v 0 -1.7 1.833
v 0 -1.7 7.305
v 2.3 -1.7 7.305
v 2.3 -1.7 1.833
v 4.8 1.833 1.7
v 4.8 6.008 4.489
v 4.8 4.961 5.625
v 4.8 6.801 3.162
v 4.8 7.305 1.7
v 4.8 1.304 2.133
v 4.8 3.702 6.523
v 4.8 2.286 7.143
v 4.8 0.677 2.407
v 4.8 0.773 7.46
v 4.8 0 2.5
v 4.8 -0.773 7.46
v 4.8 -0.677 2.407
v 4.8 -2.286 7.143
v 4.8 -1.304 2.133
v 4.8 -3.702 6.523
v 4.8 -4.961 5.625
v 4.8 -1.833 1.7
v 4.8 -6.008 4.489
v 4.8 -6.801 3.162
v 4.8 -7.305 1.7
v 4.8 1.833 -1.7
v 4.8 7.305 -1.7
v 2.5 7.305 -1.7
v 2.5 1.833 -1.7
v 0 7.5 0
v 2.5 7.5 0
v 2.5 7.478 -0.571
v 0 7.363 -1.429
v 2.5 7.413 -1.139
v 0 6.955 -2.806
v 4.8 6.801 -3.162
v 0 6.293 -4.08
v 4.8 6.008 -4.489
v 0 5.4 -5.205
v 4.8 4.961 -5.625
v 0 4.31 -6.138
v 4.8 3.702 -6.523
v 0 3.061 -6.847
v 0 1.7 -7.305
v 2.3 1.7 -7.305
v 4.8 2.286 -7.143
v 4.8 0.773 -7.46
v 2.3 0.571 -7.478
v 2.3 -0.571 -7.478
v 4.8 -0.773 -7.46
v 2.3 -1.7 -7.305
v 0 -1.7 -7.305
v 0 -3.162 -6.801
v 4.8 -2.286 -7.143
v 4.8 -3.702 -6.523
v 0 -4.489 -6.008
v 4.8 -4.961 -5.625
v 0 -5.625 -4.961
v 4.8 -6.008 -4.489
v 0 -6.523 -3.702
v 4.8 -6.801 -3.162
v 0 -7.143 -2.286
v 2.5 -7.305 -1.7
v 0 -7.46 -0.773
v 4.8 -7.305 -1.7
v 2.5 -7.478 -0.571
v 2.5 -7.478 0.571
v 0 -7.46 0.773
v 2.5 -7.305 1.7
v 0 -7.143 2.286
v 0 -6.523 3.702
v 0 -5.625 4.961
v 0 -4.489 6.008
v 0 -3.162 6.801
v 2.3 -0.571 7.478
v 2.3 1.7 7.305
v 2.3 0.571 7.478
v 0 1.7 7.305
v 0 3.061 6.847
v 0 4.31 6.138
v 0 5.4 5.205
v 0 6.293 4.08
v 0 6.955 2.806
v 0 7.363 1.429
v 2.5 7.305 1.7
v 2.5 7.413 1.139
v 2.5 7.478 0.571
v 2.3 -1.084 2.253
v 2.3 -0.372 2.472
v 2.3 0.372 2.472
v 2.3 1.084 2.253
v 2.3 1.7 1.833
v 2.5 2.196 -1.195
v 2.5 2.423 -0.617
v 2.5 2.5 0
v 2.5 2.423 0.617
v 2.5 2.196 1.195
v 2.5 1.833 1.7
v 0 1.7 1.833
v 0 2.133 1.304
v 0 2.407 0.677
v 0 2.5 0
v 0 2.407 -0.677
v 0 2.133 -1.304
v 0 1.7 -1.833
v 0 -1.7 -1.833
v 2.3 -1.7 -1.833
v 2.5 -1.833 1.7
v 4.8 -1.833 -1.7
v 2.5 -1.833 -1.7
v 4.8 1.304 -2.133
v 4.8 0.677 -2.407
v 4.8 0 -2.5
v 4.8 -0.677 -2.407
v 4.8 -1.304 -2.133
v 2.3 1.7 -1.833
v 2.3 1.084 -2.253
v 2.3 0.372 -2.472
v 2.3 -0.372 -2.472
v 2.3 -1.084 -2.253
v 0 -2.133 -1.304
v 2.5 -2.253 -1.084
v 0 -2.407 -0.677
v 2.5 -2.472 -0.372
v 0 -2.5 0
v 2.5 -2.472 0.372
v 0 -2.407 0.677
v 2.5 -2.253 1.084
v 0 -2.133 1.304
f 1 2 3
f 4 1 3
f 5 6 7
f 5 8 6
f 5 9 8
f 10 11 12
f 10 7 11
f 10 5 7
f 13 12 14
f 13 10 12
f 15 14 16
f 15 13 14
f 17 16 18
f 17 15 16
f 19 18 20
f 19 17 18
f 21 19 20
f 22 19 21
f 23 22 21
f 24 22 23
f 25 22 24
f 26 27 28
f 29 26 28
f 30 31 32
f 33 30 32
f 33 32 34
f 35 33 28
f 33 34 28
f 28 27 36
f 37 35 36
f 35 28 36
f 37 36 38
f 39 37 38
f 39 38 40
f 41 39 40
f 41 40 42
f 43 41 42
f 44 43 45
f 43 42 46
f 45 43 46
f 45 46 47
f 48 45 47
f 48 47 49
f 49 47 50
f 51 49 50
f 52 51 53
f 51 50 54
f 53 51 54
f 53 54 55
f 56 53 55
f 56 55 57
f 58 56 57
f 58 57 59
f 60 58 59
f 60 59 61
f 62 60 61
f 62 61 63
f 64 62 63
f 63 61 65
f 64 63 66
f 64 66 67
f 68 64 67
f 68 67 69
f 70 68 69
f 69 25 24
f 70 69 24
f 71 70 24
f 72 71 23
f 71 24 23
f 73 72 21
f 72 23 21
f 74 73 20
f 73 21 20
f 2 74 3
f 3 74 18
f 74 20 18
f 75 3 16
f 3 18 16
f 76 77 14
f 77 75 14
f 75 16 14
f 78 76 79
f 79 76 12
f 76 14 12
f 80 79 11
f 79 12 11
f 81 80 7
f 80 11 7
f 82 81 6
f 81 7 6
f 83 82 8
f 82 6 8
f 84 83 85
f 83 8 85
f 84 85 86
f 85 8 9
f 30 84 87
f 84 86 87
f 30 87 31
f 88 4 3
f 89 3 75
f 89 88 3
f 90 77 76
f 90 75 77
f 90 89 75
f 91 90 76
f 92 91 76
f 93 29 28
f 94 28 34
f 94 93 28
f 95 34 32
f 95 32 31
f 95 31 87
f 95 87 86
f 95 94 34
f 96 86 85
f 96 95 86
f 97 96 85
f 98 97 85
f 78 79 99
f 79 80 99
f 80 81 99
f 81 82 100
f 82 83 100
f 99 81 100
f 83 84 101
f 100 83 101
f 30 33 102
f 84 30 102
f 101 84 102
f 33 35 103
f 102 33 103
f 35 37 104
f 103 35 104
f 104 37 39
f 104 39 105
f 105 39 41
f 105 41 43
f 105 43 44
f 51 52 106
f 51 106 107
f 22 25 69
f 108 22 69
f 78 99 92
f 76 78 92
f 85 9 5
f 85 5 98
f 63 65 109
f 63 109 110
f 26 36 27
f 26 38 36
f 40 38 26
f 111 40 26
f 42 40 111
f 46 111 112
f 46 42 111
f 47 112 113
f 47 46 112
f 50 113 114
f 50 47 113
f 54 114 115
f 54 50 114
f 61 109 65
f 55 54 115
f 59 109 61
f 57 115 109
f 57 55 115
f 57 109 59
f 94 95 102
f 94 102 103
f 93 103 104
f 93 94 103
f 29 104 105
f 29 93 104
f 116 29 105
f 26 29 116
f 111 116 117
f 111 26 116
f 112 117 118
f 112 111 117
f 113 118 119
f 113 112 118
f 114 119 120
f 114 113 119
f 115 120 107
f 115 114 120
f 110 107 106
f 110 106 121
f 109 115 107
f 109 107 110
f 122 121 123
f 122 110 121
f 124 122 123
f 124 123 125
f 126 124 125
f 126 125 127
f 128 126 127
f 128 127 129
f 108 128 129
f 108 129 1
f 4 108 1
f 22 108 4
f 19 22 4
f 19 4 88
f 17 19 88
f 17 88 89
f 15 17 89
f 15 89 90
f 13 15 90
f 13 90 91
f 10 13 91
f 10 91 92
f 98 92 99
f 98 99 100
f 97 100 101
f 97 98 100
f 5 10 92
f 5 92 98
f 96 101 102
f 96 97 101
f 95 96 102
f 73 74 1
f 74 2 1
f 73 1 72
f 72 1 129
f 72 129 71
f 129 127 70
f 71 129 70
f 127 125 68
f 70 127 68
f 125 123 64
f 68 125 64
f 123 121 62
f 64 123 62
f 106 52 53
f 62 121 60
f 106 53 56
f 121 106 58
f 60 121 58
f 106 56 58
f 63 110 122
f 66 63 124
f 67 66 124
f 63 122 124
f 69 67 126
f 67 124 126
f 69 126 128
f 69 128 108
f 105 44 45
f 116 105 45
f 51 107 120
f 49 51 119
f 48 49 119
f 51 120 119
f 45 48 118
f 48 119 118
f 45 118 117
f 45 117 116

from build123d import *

# Parameters (mm, degrees)
SKETCH1_W               = 4.8
SKETCH1_H               = 5
CUT_EXTRUDE1_DEPTH      = 7.5
CUT_EXTRUDE1_DEPTH_BACK = 7.5
SKETCH2_W               = 2.3
SKETCH2_H               = 3.4
CUT_EXTRUDE2_DEPTH      = 7.5
CUT_EXTRUDE2_DEPTH_BACK = 7.5
SKETCH3_W               = 2.3
SKETCH3_H               = 3.4


with BuildPart() as part:
    # Sketch1 → Revolve1 (revolve)
    with BuildSketch(Plane.XY):
        with Locations((2.4, 5)):
            Rectangle(SKETCH1_W, SKETCH1_H)
    revolve(axis=Axis((4.8, 0, 0), (-1, 0, 0)))

    # Sketch2 → Cut-Extrude1 (cut, two sides: drawn at the far end of the back side and taken through both)
    with BuildSketch(Plane.XY.offset(-CUT_EXTRUDE1_DEPTH_BACK)):
        with Locations((1.15, 0)):
            Rectangle(SKETCH2_W, SKETCH2_H)
    extrude(amount=CUT_EXTRUDE1_DEPTH + CUT_EXTRUDE1_DEPTH_BACK, mode=Mode.SUBTRACT)

    # Sketch3 → Cut-Extrude2 (cut, two sides: drawn at the far end of the back side and taken through both)
    with BuildSketch(Plane(origin=(0, 0, 0), x_dir=(-1, 0, 0), z_dir=(0, 1, 0)).offset(-CUT_EXTRUDE2_DEPTH_BACK)):
        with Locations((-3.65, 0)):
            Rectangle(SKETCH3_W, SKETCH3_H)
    extrude(amount=CUT_EXTRUDE2_DEPTH + CUT_EXTRUDE2_DEPTH_BACK, mode=Mode.SUBTRACT)


solid = part.part
